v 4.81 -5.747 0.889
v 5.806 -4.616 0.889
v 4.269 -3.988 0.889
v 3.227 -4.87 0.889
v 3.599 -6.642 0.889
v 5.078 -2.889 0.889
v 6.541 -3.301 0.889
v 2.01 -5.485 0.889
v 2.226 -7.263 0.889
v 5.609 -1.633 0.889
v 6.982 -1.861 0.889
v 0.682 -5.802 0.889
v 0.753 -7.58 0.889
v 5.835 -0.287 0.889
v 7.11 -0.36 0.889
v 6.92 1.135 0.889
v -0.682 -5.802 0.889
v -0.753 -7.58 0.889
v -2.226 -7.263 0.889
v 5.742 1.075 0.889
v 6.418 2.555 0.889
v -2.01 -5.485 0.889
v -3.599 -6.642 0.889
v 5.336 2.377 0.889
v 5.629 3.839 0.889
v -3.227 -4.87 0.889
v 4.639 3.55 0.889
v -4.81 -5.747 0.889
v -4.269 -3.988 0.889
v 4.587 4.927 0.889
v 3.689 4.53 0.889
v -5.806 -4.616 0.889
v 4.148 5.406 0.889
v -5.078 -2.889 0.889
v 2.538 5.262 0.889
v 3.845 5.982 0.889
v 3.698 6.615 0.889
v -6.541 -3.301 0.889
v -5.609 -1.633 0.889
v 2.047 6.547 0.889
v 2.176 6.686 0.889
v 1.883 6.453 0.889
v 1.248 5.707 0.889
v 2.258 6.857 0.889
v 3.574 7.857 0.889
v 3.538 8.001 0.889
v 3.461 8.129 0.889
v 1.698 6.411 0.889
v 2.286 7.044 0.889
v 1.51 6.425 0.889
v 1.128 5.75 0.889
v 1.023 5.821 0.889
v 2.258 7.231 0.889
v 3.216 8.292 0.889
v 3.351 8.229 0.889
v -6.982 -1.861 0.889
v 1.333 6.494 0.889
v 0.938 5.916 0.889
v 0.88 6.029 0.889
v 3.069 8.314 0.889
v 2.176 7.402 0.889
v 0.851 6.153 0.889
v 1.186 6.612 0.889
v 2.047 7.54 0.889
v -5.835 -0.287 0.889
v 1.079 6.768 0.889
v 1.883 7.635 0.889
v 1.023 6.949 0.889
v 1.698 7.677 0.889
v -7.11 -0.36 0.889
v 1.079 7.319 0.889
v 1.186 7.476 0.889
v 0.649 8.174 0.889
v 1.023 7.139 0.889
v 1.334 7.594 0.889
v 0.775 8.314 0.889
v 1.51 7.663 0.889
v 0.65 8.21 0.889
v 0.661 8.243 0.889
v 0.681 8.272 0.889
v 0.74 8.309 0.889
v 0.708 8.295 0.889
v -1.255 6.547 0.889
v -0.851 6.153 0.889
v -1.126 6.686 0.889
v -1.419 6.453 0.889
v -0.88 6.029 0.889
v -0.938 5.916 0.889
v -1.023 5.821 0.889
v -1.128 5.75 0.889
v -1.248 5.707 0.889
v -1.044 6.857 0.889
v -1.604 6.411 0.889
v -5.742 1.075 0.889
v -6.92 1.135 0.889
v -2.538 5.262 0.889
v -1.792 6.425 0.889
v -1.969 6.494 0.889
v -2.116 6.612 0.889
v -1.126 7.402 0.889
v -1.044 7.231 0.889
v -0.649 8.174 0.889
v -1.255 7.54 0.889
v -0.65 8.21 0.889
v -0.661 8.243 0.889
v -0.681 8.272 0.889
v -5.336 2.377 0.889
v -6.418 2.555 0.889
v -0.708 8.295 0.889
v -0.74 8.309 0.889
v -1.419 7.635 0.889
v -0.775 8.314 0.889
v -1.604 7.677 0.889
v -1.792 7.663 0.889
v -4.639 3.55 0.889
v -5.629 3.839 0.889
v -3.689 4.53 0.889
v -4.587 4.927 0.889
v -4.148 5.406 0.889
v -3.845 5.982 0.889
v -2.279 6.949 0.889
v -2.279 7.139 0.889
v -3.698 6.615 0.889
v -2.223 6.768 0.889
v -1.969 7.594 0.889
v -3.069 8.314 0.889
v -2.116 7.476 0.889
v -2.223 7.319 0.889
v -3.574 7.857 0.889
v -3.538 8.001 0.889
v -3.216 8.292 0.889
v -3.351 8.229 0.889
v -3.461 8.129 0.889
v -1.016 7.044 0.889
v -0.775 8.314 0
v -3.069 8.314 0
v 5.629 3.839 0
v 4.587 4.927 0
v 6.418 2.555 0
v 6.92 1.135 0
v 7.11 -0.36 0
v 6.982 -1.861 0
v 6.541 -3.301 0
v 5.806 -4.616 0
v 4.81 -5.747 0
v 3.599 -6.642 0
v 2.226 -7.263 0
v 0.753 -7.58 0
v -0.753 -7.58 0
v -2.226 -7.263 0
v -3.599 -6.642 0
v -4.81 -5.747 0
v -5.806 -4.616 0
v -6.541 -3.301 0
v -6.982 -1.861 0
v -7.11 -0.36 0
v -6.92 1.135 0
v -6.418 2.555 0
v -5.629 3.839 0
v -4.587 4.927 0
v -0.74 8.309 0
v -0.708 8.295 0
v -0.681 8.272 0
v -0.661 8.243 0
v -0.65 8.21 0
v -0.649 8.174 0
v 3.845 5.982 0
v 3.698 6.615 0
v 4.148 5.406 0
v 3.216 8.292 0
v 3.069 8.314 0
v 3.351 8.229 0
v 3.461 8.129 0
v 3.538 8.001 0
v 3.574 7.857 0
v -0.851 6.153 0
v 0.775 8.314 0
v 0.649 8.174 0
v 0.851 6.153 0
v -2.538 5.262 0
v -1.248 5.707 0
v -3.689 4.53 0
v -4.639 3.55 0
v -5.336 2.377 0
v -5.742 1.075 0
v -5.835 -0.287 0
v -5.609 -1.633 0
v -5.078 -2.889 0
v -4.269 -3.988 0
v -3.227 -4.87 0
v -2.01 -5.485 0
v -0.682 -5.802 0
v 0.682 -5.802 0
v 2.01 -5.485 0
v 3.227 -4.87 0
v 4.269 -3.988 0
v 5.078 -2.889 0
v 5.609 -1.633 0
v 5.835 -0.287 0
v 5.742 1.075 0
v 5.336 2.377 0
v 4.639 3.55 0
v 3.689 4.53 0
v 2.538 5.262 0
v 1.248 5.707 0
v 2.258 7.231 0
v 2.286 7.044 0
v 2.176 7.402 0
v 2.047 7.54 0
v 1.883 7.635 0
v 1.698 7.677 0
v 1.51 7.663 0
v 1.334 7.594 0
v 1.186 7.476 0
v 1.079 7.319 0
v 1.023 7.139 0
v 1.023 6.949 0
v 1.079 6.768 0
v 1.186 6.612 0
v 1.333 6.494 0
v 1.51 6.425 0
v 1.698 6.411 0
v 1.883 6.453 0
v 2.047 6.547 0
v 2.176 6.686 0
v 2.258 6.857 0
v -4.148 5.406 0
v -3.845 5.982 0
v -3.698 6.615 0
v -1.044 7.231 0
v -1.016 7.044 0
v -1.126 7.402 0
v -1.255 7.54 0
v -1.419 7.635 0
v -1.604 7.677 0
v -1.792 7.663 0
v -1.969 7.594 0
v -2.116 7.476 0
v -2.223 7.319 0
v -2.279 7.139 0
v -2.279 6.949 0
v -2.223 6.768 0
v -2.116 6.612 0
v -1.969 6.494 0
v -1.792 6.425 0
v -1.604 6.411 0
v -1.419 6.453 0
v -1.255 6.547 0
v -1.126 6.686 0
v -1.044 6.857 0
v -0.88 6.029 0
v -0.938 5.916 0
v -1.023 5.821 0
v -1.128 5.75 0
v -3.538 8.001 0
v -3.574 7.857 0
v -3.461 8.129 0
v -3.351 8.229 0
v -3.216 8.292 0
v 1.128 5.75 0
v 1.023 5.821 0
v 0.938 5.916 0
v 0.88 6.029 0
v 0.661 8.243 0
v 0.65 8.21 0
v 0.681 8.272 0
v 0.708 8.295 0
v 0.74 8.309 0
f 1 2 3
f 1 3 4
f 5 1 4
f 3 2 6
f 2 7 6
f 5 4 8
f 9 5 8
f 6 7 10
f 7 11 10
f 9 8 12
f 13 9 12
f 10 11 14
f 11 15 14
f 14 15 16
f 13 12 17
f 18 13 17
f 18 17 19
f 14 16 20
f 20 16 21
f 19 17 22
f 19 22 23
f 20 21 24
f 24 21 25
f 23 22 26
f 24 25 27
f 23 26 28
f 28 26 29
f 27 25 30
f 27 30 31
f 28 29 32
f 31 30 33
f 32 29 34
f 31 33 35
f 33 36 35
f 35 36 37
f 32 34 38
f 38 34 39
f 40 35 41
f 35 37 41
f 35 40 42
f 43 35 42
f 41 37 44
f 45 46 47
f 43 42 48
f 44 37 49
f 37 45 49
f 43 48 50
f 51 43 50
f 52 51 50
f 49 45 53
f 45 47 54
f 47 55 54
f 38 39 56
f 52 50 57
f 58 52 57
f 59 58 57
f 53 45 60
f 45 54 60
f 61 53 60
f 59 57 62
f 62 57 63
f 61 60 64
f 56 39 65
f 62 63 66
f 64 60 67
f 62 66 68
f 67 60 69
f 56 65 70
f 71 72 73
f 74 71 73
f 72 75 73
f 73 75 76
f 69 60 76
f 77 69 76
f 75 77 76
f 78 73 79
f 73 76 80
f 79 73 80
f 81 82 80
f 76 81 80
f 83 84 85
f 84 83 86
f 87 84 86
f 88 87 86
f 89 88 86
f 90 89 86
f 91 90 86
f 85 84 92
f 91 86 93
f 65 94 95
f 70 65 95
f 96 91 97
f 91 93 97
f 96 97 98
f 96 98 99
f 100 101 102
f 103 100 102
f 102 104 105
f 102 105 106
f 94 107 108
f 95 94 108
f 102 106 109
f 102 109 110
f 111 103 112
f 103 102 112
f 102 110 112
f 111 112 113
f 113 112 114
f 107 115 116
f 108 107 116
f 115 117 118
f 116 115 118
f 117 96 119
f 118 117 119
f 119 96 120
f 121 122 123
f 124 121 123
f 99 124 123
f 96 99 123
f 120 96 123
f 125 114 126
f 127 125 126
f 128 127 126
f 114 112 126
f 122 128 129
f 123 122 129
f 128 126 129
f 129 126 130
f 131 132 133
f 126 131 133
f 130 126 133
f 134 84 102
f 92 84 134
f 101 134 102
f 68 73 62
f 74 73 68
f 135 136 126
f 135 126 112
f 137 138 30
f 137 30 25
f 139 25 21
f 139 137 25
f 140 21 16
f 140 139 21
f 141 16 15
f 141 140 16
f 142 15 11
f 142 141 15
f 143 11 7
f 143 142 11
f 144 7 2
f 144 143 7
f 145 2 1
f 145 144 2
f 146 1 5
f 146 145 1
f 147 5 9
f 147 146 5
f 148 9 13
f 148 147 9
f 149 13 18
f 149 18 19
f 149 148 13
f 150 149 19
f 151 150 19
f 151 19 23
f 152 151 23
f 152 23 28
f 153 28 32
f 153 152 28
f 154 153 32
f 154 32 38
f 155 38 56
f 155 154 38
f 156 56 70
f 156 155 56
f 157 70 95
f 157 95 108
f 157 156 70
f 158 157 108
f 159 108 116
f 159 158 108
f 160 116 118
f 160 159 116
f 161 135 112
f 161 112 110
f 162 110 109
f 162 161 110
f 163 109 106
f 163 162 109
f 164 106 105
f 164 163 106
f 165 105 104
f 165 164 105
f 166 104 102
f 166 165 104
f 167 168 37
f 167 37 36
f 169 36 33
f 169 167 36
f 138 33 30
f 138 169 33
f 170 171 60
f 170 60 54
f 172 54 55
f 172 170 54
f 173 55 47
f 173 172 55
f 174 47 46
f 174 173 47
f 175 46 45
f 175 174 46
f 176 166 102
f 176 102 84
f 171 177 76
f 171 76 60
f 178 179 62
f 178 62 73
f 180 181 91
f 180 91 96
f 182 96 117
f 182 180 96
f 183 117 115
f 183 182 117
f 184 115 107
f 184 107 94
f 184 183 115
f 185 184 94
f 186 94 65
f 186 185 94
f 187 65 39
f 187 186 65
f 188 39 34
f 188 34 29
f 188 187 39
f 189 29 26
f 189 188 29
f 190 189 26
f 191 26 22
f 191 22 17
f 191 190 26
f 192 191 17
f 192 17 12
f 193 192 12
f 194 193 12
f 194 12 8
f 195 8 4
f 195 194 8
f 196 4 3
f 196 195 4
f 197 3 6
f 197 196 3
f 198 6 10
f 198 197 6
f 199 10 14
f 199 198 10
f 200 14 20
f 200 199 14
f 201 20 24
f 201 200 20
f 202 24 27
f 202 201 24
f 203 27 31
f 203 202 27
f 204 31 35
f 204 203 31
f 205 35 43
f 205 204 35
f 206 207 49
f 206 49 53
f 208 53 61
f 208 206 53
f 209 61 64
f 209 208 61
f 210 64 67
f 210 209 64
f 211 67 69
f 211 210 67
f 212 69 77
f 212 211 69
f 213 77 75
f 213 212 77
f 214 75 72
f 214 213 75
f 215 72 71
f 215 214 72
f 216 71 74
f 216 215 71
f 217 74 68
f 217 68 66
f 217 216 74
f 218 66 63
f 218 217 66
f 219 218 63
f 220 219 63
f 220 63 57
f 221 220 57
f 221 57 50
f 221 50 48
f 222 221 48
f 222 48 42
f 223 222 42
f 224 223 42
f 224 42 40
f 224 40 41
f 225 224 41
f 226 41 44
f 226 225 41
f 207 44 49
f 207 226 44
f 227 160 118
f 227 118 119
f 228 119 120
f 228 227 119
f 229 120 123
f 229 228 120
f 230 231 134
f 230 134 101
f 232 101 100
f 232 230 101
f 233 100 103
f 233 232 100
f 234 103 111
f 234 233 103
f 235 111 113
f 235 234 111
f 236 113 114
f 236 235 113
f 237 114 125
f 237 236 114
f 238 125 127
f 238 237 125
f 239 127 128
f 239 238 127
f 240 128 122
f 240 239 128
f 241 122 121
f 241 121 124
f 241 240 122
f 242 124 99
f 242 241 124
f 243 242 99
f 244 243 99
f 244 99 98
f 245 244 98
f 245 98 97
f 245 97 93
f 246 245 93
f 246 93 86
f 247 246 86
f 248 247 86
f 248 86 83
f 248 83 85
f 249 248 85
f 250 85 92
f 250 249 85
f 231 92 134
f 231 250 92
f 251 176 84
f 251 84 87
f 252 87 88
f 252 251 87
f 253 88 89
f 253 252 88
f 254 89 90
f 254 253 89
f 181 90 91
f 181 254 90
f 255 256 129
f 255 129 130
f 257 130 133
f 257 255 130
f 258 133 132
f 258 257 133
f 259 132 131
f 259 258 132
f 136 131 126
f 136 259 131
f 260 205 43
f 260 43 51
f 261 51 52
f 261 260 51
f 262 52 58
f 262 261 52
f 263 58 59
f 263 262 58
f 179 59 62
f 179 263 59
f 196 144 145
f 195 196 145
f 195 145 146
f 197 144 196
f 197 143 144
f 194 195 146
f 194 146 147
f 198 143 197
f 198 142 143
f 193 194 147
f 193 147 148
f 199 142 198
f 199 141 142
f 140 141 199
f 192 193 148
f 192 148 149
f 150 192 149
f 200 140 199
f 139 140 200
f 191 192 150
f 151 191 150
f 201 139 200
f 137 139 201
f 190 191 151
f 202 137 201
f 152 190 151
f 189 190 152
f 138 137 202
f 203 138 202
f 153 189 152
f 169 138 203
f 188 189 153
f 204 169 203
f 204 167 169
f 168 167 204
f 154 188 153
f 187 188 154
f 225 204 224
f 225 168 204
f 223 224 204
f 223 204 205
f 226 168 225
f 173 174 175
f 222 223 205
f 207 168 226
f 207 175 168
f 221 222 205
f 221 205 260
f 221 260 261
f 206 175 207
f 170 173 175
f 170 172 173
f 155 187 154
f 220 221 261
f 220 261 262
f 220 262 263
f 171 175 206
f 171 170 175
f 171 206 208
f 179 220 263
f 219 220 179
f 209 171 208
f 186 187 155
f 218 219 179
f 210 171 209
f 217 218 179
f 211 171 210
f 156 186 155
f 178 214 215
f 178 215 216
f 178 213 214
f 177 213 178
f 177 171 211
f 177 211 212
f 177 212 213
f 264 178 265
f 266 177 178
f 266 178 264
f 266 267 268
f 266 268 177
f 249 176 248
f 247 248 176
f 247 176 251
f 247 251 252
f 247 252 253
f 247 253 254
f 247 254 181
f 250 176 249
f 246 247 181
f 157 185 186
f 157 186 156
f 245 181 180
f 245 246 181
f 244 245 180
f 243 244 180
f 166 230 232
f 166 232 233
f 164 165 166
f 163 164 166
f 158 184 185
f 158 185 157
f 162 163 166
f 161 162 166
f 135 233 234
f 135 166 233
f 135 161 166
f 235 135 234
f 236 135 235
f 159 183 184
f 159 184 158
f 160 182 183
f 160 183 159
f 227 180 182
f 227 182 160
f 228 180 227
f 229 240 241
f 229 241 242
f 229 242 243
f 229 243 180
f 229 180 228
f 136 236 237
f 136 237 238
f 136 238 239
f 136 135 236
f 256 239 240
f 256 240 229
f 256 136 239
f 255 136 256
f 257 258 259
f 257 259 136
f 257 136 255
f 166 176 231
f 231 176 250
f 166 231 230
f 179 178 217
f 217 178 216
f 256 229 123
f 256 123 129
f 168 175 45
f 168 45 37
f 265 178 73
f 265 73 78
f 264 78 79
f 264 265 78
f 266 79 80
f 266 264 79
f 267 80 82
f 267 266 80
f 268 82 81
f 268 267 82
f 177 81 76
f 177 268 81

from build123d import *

# Parameters (mm, degrees)
SKETCH1_R           = 0.635
BOSS_EXTRUDE1_DEPTH = 0.889


with BuildPart() as part:
    # Sketch1 → Boss-Extrude1 (new body)
    with BuildSketch(Plane.XY):
        with BuildLine():
            Line((-3.698228745, 6.615080486), (-3.574085754, 7.856510393))
            ThreePointArc((-3.574085754, 7.856510393), (-3.409477564, 8.182620391), (-3.068606861, 8.313962504))
            Line((-3.068606861, 8.313962504), (-0.77533342, 8.313962504))
            ThreePointArc((-0.77533342, 8.313962504), (-0.681168949, 8.27218018), (-0.648963697, 8.174325532))
            Line((-0.648963697, 8.174325532), (-0.851111104, 6.152851468))
            ThreePointArc((-0.851111104, 6.152851468), (-0.97722427, 5.865544883), (-1.248062797, 5.707127408))
            ThreePointArc((-1.248062797, 5.707127408), (0, -5.842), (1.248062797, 5.707127408))
            ThreePointArc((1.248062797, 5.707127408), (0.97722427, 5.865544883), (0.851111104, 6.152851468))
            Line((0.851111104, 6.152851468), (0.648963697, 8.174325532))
            ThreePointArc((0.648963697, 8.174325532), (0.681168949, 8.27218018), (0.77533342, 8.313962504))
            Line((0.77533342, 8.313962504), (3.068606861, 8.313962504))
            ThreePointArc((3.068606861, 8.313962504), (3.409477564, 8.182620391), (3.574085754, 7.856510393))
            Line((3.574085754, 7.856510393), (3.698228745, 6.615080486))
            ThreePointArc((3.698228745, 6.615080486), (3.978211686, 5.684290697), (4.587301311, 4.926814687))
            ThreePointArc((4.587301311, 4.926814687), (0, -7.62), (-4.587301311, 4.926814687))
            ThreePointArc((-4.587301311, 4.926814687), (-3.978211686, 5.684290697), (-3.698228745, 6.615080486))
        make_face()
        with Locations((-1.651, 7.043962504)):
            Circle(SKETCH1_R, mode=Mode.SUBTRACT)
        with Locations((1.651, 7.043962504)):
            Circle(SKETCH1_R, mode=Mode.SUBTRACT)
    extrude(amount=BOSS_EXTRUDE1_DEPTH)


solid = part.part
